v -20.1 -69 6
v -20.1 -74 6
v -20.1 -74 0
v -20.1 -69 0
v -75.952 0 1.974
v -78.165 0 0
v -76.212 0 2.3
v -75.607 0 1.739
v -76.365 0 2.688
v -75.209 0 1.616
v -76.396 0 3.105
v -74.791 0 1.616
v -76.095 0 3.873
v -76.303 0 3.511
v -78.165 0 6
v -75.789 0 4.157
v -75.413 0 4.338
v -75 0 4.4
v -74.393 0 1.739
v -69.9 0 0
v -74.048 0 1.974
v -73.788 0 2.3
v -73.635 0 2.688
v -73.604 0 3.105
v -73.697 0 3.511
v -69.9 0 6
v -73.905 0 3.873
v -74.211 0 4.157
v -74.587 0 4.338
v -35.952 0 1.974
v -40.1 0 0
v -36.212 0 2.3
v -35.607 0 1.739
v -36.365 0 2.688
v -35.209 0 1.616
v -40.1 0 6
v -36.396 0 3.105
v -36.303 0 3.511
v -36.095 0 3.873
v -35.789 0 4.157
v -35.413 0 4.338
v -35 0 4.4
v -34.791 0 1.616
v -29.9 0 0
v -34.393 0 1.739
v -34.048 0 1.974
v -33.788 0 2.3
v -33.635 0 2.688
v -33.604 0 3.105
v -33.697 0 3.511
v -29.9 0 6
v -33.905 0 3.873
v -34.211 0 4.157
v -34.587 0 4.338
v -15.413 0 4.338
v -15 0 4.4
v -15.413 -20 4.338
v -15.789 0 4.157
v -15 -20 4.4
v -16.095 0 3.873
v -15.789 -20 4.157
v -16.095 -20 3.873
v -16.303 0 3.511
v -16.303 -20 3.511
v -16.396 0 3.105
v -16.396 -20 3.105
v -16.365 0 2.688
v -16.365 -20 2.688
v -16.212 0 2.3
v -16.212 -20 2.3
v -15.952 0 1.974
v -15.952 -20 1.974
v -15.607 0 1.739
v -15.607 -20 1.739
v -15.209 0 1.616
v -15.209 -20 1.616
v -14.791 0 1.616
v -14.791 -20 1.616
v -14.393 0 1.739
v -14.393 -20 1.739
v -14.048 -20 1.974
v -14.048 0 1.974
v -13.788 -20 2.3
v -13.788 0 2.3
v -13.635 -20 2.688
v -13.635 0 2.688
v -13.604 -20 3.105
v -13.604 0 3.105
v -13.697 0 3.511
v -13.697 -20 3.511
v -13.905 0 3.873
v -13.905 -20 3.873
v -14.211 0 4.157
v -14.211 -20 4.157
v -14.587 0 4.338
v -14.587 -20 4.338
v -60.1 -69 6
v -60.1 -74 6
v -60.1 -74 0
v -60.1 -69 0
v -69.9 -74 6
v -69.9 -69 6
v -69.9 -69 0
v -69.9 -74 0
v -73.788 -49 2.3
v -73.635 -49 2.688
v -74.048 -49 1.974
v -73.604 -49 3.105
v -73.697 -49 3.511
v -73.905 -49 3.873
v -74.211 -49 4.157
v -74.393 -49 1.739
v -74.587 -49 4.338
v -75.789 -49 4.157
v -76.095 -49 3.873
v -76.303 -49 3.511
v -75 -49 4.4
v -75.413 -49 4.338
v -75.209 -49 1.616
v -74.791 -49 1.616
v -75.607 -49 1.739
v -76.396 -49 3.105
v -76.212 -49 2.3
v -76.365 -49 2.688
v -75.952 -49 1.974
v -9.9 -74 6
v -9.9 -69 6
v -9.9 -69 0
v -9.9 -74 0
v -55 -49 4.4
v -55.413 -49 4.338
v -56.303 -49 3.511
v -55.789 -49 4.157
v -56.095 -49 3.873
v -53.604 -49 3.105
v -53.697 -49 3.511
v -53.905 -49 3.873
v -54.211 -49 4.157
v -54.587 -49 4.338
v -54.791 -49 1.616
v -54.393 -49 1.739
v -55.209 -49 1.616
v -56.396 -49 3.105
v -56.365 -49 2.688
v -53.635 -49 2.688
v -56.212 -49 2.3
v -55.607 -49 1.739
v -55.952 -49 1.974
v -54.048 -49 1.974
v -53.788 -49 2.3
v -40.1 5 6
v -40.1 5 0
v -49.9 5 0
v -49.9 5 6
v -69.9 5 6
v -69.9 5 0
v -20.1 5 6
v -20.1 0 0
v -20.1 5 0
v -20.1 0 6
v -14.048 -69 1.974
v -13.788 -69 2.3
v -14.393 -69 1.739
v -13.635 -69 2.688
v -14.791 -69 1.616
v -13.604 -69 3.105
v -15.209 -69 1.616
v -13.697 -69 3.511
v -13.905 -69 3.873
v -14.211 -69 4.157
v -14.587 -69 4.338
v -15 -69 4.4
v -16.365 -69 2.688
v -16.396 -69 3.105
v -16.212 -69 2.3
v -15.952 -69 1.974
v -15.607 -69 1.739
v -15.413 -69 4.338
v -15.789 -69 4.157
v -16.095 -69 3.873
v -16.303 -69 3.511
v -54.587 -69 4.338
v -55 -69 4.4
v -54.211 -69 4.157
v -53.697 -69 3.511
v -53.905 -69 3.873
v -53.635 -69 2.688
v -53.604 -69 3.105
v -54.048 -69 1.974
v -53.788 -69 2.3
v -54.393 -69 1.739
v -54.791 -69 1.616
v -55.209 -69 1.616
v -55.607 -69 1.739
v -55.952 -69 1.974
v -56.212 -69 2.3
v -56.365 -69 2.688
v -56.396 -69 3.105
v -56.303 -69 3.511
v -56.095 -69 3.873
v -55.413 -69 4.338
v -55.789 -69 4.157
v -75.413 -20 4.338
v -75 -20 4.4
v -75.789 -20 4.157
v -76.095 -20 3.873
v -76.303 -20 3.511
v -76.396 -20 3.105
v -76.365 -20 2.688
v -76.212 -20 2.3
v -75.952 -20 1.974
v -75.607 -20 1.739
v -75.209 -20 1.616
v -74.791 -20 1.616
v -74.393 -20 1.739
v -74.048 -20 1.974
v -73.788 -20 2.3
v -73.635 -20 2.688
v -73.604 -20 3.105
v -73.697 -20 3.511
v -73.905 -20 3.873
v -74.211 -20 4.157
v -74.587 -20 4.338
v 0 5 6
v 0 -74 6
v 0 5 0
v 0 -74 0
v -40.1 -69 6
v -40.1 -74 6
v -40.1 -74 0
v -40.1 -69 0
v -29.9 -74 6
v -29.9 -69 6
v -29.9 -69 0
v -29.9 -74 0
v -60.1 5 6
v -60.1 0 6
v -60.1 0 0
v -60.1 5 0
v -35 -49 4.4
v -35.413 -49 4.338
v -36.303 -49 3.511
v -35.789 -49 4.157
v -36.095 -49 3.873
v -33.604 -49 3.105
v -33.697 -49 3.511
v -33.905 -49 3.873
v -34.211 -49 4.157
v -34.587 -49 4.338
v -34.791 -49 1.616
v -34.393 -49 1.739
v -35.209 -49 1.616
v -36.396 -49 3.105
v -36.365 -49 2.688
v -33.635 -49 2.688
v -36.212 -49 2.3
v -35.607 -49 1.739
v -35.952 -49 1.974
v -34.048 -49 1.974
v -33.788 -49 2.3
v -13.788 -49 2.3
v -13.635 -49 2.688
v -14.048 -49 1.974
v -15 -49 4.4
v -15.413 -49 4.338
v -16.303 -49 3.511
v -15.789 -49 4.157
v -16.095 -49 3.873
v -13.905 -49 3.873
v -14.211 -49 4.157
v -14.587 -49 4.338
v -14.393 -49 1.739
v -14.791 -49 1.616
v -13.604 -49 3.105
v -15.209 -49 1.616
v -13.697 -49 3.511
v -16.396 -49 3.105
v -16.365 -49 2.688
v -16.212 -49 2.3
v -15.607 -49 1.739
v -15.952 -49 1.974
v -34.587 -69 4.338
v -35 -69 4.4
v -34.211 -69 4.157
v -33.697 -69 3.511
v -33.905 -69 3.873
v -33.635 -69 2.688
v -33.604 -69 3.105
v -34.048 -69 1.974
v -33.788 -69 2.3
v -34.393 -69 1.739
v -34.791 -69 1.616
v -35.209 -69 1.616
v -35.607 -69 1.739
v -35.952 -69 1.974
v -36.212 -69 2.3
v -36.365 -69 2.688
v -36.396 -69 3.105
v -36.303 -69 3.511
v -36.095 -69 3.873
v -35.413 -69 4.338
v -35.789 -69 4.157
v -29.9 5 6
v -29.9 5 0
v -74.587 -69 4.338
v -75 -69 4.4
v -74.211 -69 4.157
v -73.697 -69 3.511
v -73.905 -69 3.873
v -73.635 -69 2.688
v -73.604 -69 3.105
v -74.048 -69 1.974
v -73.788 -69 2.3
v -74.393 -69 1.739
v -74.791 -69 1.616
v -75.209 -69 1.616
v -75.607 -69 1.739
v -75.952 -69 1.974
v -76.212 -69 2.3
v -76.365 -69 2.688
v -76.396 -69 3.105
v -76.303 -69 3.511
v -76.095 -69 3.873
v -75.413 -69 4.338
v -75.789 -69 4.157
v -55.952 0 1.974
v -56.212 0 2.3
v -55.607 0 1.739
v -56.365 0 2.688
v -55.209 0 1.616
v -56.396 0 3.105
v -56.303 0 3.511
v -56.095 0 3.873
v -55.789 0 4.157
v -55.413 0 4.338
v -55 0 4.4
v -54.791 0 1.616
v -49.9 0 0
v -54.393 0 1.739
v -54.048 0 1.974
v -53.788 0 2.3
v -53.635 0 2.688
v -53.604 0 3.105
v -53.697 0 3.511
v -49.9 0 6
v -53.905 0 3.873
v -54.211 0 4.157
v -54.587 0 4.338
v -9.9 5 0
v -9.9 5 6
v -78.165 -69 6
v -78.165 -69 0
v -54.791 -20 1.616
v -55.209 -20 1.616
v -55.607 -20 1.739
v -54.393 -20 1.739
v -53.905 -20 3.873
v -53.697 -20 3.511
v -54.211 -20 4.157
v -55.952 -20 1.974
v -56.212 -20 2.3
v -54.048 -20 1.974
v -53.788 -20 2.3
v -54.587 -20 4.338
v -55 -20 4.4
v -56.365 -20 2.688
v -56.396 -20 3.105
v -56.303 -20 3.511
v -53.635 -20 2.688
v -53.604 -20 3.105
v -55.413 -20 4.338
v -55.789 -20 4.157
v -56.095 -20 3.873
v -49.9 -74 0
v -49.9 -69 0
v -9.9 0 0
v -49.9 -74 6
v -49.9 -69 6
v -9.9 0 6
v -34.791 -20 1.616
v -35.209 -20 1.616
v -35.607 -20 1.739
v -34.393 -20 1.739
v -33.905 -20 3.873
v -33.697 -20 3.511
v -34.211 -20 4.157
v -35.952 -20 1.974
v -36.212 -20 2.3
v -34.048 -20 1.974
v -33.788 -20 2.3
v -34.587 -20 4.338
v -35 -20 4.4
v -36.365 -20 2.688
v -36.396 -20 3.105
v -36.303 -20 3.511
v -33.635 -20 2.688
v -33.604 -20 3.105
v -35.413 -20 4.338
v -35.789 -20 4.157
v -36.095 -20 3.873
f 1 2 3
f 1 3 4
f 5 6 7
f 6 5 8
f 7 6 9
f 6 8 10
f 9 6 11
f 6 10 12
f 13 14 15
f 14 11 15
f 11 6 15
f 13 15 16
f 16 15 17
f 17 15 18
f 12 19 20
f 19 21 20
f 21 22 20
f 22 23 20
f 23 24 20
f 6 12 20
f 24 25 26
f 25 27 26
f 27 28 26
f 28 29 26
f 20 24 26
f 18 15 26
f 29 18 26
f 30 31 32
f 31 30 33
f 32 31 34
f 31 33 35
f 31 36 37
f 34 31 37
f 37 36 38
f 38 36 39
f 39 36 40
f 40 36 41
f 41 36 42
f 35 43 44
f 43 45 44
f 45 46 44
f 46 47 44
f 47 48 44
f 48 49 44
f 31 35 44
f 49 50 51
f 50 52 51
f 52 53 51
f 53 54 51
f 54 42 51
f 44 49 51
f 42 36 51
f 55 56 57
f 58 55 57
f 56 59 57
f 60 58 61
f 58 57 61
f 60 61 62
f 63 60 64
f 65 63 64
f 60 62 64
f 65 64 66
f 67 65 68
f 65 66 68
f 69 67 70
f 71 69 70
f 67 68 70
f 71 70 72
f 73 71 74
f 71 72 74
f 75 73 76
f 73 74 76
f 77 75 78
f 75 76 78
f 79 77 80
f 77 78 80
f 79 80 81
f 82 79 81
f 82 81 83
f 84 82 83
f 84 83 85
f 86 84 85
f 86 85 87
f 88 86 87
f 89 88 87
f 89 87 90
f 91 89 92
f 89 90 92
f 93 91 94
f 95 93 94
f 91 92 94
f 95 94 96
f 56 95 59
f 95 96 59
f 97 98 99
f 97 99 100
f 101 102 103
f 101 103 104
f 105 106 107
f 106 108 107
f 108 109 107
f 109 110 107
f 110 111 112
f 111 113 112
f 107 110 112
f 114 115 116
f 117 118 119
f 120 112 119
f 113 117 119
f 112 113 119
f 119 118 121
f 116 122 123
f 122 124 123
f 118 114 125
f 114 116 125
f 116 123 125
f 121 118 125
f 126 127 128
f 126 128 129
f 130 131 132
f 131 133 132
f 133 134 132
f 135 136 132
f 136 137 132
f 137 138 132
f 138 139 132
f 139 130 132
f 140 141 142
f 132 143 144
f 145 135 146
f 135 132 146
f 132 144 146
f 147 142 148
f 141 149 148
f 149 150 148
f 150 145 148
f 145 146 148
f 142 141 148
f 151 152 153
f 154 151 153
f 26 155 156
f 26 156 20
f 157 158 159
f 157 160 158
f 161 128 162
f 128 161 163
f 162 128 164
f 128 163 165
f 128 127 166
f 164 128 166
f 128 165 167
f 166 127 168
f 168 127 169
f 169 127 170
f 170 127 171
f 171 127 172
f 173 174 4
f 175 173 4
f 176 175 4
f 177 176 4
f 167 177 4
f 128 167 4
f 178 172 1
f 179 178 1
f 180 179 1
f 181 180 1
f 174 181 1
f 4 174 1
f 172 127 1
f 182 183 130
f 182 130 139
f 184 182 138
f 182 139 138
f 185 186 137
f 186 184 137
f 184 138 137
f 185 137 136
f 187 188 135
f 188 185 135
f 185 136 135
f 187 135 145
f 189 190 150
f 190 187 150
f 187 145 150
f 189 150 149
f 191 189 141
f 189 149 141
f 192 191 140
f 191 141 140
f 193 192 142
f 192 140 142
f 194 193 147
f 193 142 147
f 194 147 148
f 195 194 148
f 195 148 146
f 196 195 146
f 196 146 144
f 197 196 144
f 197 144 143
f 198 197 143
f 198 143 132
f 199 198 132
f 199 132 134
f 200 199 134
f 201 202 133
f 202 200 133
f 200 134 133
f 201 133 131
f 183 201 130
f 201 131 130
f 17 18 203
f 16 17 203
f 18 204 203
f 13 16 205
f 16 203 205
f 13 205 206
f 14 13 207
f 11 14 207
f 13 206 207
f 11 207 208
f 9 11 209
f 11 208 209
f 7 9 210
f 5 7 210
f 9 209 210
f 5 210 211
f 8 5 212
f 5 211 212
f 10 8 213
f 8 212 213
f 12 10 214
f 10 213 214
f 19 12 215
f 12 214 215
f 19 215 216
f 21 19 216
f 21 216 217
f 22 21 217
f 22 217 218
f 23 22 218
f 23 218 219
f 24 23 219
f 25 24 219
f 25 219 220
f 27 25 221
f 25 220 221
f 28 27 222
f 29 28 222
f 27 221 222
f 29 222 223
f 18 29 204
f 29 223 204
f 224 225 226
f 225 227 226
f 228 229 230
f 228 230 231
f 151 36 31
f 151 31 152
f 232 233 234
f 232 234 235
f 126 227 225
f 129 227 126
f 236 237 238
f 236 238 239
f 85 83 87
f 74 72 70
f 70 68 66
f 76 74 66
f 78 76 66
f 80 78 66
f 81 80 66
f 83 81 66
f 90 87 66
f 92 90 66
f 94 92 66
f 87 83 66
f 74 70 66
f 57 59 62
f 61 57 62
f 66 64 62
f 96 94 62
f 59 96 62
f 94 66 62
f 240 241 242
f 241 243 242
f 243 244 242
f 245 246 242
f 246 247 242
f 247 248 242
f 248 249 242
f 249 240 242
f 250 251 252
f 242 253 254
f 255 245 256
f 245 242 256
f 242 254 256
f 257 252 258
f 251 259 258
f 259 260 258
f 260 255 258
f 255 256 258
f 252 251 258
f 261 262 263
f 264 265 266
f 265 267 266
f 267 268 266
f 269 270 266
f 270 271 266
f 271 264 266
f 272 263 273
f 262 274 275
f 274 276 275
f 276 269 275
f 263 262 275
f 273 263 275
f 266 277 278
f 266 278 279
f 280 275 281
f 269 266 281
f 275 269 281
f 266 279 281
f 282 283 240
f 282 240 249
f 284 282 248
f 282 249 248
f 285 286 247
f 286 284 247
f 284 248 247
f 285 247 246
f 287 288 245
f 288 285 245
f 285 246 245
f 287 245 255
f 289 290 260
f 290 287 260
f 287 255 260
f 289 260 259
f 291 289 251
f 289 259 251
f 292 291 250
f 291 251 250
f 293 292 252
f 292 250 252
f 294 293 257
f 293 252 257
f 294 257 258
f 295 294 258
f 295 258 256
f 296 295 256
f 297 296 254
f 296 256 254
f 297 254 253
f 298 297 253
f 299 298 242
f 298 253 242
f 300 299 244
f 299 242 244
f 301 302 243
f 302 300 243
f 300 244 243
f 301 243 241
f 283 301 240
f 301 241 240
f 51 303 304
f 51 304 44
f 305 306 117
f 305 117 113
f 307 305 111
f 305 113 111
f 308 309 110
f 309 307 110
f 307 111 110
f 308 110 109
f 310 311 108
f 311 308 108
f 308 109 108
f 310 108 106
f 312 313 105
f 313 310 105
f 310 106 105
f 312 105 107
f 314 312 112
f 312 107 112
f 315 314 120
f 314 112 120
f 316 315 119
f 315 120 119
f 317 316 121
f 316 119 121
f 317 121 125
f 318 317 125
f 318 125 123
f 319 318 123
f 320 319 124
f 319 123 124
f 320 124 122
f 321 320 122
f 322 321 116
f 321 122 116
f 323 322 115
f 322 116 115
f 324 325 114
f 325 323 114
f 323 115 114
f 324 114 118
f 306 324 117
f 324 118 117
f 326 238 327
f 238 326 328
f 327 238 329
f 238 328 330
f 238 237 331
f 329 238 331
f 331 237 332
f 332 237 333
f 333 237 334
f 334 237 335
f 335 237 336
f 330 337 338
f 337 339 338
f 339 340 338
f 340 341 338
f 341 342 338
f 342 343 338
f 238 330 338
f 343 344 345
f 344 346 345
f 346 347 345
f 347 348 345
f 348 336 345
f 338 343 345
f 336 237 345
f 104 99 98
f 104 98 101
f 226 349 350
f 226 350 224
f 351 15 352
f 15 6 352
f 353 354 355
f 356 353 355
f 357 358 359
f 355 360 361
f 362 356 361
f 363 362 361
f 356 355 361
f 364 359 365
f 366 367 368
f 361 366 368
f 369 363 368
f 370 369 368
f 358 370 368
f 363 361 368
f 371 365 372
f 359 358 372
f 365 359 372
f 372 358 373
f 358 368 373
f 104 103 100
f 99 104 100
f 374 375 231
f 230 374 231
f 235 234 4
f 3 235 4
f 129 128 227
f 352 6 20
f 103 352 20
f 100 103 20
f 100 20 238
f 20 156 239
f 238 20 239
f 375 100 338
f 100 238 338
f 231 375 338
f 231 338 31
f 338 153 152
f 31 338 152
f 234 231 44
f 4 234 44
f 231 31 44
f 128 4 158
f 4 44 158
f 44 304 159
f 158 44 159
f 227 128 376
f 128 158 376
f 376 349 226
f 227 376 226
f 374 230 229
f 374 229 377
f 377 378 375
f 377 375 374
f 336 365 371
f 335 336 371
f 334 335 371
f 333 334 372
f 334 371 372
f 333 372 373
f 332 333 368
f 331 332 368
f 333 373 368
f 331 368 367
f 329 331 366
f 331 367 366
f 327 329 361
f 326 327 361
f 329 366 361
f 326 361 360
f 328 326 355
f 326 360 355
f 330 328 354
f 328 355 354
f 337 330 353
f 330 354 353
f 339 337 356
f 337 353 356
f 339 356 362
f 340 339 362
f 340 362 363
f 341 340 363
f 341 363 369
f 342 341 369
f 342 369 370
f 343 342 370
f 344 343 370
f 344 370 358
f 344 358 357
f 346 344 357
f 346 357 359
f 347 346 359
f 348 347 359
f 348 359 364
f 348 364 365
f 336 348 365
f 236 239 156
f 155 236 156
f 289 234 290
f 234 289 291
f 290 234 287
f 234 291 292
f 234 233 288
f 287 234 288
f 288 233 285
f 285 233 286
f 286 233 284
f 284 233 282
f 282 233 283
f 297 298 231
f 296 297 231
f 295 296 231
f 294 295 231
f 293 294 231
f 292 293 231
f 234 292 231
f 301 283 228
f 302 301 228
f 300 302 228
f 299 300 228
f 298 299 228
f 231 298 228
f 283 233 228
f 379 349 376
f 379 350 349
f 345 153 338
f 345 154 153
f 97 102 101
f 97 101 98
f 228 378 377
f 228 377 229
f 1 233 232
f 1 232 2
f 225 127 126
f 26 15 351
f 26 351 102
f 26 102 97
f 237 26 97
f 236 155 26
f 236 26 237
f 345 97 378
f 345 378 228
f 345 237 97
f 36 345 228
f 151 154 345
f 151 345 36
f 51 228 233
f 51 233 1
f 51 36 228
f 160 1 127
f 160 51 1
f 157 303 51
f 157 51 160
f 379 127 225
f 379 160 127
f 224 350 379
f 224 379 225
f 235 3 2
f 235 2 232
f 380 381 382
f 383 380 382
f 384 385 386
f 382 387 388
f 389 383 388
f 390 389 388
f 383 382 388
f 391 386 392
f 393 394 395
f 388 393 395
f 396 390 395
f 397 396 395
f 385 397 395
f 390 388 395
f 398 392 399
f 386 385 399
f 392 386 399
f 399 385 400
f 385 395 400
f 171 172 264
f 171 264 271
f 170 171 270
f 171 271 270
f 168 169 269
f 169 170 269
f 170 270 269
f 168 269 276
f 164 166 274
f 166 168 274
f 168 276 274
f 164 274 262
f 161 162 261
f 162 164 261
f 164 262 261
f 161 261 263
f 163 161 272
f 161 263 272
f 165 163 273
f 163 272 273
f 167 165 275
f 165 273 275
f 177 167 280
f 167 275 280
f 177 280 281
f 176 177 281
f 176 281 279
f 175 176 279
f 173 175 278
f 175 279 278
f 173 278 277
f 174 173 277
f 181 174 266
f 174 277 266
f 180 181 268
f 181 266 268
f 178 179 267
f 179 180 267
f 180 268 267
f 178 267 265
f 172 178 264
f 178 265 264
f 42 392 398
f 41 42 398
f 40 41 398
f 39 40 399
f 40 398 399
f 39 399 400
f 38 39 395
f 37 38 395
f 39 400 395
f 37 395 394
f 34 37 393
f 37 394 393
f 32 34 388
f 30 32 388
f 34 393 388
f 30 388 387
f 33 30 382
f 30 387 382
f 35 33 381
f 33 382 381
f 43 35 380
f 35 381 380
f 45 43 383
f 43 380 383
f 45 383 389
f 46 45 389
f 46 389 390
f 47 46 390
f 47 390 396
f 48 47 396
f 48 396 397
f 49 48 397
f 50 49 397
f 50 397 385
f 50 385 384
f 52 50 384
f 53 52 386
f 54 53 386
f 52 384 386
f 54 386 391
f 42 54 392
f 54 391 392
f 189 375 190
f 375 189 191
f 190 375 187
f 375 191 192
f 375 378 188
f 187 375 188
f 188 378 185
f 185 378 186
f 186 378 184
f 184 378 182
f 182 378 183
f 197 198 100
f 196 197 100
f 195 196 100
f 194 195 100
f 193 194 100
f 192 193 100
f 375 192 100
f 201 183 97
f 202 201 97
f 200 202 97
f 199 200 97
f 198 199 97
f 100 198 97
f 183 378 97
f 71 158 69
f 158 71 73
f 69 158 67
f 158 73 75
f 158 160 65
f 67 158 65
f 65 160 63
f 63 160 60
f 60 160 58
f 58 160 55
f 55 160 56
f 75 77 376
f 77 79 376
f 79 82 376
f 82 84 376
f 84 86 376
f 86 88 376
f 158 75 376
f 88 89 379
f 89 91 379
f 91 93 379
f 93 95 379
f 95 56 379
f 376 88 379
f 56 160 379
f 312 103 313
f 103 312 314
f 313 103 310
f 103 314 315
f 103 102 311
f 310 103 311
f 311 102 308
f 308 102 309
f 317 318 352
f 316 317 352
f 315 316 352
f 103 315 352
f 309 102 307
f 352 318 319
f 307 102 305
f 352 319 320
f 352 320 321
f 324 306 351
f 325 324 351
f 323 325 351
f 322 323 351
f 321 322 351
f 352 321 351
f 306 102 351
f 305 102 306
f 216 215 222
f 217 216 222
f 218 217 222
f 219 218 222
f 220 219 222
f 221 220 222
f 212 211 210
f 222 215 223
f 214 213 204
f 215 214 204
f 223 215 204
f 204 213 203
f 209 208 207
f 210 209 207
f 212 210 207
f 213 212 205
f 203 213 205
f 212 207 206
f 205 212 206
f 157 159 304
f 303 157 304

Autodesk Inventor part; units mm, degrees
ref_plane "YZ Plane" through (0, 0, 0) normal (1, 0, 0) x (0, 1, 0)
ref_plane "XZ Plane" through (0, 0, 0) normal (0, 1, 0) x (-1, 0, 0)
ref_plane "XY Plane" through (0, 0, 0) normal (0, 0, 1) x (1, 0, 0)
sketch "Sketch1" plane through (0, 0, 0) normal (0, 0, 1) x (1, 0, 0)
  line L0 (0, -120) -> (0, 155.2673) projected
  line L1 (-130, 0) -> (-130, 5) projected
  line L2 (-10, 5) -> (0, 5) projected
  line L3 (0, -74) -> (-9.8, -74) projected
  line L4 (-130, 5) -> (-120, 5) projected
  line L5 (-120.2, -74) -> (-129.8, -74) projected
  line L6 (-129.8, -69) -> (-129.8, -74) projected
  line L7 (0, 5) -> (-78.1654, 5)
  line L8 (-78.1654, 5) -> (-78.1654, -74)
  line L9 (-78.1654, -74) -> (0, -74)
  line L10 (0, -74) -> (0, 5)
  line L11 (-155.5538, 0) -> (-155.5538, 5) projected
  line L12 (-170.1, 0) -> (-170.1, 5) projected
  line L13 (-78.2654, -73) -> (-78.2654, -4) projected
  point P0 (0, 0)
  dimension "d36" = 0.1
extrude "Extrusion1" add sketch "Sketch1" along normal blind 6
sketch "Sketch2" plane through (0, 0, 6) normal (0, 0, 1) x (1, 0, 0)
  line L0 (-10, 0) -> (-10, 5) projected
  line L1 (0, 5) -> (-78.1654, 5) projected
  line L2 (-20, 0) -> (-10, 0) projected
  line L3 (-20, 5) -> (-20, 0) projected
  line L4 (-9.9, 5) -> (-9.9, 0)
  line L5 (-20.1, 0) -> (-20.1, 5)
  line L6 (-10, 0) -> (-9.9, 0)
  line L7 (-20, 0) -> (-20.1, 0)
  point P0 (-130, 5)
extrude "Extrusion2" cut sketch "Sketch2" against normal blind 6
sketch "Sketch3" plane through (-20.1, 0, 6) normal (0, 1, 0) x (1, 0, 0)
  circle A0 centre (5.1, 3) radius 1.5 projected
  point P0 (20.1, 6)
hole "Hole1" at (-15, 0, 3) direction (0, -1, 0) diameter 2.8 depth 20
pattern_linear "Rectangular Pattern2" count 9 spacing 20 along (-1, 0, 0) of "Extrusion2", "Hole1"
ref_plane "Work Plane1" through (-20.1, -34.5, 6) normal (0, 1, 0) x (1, 0, 0)
mirror "Mirror1" about plane through (-20.1, -34.5, 6) normal (0, 1, 0) of "Extrusion2", "Hole1", "Rectangular Pattern2"
properties part number "00_Baseplate_Simmo_side5"
